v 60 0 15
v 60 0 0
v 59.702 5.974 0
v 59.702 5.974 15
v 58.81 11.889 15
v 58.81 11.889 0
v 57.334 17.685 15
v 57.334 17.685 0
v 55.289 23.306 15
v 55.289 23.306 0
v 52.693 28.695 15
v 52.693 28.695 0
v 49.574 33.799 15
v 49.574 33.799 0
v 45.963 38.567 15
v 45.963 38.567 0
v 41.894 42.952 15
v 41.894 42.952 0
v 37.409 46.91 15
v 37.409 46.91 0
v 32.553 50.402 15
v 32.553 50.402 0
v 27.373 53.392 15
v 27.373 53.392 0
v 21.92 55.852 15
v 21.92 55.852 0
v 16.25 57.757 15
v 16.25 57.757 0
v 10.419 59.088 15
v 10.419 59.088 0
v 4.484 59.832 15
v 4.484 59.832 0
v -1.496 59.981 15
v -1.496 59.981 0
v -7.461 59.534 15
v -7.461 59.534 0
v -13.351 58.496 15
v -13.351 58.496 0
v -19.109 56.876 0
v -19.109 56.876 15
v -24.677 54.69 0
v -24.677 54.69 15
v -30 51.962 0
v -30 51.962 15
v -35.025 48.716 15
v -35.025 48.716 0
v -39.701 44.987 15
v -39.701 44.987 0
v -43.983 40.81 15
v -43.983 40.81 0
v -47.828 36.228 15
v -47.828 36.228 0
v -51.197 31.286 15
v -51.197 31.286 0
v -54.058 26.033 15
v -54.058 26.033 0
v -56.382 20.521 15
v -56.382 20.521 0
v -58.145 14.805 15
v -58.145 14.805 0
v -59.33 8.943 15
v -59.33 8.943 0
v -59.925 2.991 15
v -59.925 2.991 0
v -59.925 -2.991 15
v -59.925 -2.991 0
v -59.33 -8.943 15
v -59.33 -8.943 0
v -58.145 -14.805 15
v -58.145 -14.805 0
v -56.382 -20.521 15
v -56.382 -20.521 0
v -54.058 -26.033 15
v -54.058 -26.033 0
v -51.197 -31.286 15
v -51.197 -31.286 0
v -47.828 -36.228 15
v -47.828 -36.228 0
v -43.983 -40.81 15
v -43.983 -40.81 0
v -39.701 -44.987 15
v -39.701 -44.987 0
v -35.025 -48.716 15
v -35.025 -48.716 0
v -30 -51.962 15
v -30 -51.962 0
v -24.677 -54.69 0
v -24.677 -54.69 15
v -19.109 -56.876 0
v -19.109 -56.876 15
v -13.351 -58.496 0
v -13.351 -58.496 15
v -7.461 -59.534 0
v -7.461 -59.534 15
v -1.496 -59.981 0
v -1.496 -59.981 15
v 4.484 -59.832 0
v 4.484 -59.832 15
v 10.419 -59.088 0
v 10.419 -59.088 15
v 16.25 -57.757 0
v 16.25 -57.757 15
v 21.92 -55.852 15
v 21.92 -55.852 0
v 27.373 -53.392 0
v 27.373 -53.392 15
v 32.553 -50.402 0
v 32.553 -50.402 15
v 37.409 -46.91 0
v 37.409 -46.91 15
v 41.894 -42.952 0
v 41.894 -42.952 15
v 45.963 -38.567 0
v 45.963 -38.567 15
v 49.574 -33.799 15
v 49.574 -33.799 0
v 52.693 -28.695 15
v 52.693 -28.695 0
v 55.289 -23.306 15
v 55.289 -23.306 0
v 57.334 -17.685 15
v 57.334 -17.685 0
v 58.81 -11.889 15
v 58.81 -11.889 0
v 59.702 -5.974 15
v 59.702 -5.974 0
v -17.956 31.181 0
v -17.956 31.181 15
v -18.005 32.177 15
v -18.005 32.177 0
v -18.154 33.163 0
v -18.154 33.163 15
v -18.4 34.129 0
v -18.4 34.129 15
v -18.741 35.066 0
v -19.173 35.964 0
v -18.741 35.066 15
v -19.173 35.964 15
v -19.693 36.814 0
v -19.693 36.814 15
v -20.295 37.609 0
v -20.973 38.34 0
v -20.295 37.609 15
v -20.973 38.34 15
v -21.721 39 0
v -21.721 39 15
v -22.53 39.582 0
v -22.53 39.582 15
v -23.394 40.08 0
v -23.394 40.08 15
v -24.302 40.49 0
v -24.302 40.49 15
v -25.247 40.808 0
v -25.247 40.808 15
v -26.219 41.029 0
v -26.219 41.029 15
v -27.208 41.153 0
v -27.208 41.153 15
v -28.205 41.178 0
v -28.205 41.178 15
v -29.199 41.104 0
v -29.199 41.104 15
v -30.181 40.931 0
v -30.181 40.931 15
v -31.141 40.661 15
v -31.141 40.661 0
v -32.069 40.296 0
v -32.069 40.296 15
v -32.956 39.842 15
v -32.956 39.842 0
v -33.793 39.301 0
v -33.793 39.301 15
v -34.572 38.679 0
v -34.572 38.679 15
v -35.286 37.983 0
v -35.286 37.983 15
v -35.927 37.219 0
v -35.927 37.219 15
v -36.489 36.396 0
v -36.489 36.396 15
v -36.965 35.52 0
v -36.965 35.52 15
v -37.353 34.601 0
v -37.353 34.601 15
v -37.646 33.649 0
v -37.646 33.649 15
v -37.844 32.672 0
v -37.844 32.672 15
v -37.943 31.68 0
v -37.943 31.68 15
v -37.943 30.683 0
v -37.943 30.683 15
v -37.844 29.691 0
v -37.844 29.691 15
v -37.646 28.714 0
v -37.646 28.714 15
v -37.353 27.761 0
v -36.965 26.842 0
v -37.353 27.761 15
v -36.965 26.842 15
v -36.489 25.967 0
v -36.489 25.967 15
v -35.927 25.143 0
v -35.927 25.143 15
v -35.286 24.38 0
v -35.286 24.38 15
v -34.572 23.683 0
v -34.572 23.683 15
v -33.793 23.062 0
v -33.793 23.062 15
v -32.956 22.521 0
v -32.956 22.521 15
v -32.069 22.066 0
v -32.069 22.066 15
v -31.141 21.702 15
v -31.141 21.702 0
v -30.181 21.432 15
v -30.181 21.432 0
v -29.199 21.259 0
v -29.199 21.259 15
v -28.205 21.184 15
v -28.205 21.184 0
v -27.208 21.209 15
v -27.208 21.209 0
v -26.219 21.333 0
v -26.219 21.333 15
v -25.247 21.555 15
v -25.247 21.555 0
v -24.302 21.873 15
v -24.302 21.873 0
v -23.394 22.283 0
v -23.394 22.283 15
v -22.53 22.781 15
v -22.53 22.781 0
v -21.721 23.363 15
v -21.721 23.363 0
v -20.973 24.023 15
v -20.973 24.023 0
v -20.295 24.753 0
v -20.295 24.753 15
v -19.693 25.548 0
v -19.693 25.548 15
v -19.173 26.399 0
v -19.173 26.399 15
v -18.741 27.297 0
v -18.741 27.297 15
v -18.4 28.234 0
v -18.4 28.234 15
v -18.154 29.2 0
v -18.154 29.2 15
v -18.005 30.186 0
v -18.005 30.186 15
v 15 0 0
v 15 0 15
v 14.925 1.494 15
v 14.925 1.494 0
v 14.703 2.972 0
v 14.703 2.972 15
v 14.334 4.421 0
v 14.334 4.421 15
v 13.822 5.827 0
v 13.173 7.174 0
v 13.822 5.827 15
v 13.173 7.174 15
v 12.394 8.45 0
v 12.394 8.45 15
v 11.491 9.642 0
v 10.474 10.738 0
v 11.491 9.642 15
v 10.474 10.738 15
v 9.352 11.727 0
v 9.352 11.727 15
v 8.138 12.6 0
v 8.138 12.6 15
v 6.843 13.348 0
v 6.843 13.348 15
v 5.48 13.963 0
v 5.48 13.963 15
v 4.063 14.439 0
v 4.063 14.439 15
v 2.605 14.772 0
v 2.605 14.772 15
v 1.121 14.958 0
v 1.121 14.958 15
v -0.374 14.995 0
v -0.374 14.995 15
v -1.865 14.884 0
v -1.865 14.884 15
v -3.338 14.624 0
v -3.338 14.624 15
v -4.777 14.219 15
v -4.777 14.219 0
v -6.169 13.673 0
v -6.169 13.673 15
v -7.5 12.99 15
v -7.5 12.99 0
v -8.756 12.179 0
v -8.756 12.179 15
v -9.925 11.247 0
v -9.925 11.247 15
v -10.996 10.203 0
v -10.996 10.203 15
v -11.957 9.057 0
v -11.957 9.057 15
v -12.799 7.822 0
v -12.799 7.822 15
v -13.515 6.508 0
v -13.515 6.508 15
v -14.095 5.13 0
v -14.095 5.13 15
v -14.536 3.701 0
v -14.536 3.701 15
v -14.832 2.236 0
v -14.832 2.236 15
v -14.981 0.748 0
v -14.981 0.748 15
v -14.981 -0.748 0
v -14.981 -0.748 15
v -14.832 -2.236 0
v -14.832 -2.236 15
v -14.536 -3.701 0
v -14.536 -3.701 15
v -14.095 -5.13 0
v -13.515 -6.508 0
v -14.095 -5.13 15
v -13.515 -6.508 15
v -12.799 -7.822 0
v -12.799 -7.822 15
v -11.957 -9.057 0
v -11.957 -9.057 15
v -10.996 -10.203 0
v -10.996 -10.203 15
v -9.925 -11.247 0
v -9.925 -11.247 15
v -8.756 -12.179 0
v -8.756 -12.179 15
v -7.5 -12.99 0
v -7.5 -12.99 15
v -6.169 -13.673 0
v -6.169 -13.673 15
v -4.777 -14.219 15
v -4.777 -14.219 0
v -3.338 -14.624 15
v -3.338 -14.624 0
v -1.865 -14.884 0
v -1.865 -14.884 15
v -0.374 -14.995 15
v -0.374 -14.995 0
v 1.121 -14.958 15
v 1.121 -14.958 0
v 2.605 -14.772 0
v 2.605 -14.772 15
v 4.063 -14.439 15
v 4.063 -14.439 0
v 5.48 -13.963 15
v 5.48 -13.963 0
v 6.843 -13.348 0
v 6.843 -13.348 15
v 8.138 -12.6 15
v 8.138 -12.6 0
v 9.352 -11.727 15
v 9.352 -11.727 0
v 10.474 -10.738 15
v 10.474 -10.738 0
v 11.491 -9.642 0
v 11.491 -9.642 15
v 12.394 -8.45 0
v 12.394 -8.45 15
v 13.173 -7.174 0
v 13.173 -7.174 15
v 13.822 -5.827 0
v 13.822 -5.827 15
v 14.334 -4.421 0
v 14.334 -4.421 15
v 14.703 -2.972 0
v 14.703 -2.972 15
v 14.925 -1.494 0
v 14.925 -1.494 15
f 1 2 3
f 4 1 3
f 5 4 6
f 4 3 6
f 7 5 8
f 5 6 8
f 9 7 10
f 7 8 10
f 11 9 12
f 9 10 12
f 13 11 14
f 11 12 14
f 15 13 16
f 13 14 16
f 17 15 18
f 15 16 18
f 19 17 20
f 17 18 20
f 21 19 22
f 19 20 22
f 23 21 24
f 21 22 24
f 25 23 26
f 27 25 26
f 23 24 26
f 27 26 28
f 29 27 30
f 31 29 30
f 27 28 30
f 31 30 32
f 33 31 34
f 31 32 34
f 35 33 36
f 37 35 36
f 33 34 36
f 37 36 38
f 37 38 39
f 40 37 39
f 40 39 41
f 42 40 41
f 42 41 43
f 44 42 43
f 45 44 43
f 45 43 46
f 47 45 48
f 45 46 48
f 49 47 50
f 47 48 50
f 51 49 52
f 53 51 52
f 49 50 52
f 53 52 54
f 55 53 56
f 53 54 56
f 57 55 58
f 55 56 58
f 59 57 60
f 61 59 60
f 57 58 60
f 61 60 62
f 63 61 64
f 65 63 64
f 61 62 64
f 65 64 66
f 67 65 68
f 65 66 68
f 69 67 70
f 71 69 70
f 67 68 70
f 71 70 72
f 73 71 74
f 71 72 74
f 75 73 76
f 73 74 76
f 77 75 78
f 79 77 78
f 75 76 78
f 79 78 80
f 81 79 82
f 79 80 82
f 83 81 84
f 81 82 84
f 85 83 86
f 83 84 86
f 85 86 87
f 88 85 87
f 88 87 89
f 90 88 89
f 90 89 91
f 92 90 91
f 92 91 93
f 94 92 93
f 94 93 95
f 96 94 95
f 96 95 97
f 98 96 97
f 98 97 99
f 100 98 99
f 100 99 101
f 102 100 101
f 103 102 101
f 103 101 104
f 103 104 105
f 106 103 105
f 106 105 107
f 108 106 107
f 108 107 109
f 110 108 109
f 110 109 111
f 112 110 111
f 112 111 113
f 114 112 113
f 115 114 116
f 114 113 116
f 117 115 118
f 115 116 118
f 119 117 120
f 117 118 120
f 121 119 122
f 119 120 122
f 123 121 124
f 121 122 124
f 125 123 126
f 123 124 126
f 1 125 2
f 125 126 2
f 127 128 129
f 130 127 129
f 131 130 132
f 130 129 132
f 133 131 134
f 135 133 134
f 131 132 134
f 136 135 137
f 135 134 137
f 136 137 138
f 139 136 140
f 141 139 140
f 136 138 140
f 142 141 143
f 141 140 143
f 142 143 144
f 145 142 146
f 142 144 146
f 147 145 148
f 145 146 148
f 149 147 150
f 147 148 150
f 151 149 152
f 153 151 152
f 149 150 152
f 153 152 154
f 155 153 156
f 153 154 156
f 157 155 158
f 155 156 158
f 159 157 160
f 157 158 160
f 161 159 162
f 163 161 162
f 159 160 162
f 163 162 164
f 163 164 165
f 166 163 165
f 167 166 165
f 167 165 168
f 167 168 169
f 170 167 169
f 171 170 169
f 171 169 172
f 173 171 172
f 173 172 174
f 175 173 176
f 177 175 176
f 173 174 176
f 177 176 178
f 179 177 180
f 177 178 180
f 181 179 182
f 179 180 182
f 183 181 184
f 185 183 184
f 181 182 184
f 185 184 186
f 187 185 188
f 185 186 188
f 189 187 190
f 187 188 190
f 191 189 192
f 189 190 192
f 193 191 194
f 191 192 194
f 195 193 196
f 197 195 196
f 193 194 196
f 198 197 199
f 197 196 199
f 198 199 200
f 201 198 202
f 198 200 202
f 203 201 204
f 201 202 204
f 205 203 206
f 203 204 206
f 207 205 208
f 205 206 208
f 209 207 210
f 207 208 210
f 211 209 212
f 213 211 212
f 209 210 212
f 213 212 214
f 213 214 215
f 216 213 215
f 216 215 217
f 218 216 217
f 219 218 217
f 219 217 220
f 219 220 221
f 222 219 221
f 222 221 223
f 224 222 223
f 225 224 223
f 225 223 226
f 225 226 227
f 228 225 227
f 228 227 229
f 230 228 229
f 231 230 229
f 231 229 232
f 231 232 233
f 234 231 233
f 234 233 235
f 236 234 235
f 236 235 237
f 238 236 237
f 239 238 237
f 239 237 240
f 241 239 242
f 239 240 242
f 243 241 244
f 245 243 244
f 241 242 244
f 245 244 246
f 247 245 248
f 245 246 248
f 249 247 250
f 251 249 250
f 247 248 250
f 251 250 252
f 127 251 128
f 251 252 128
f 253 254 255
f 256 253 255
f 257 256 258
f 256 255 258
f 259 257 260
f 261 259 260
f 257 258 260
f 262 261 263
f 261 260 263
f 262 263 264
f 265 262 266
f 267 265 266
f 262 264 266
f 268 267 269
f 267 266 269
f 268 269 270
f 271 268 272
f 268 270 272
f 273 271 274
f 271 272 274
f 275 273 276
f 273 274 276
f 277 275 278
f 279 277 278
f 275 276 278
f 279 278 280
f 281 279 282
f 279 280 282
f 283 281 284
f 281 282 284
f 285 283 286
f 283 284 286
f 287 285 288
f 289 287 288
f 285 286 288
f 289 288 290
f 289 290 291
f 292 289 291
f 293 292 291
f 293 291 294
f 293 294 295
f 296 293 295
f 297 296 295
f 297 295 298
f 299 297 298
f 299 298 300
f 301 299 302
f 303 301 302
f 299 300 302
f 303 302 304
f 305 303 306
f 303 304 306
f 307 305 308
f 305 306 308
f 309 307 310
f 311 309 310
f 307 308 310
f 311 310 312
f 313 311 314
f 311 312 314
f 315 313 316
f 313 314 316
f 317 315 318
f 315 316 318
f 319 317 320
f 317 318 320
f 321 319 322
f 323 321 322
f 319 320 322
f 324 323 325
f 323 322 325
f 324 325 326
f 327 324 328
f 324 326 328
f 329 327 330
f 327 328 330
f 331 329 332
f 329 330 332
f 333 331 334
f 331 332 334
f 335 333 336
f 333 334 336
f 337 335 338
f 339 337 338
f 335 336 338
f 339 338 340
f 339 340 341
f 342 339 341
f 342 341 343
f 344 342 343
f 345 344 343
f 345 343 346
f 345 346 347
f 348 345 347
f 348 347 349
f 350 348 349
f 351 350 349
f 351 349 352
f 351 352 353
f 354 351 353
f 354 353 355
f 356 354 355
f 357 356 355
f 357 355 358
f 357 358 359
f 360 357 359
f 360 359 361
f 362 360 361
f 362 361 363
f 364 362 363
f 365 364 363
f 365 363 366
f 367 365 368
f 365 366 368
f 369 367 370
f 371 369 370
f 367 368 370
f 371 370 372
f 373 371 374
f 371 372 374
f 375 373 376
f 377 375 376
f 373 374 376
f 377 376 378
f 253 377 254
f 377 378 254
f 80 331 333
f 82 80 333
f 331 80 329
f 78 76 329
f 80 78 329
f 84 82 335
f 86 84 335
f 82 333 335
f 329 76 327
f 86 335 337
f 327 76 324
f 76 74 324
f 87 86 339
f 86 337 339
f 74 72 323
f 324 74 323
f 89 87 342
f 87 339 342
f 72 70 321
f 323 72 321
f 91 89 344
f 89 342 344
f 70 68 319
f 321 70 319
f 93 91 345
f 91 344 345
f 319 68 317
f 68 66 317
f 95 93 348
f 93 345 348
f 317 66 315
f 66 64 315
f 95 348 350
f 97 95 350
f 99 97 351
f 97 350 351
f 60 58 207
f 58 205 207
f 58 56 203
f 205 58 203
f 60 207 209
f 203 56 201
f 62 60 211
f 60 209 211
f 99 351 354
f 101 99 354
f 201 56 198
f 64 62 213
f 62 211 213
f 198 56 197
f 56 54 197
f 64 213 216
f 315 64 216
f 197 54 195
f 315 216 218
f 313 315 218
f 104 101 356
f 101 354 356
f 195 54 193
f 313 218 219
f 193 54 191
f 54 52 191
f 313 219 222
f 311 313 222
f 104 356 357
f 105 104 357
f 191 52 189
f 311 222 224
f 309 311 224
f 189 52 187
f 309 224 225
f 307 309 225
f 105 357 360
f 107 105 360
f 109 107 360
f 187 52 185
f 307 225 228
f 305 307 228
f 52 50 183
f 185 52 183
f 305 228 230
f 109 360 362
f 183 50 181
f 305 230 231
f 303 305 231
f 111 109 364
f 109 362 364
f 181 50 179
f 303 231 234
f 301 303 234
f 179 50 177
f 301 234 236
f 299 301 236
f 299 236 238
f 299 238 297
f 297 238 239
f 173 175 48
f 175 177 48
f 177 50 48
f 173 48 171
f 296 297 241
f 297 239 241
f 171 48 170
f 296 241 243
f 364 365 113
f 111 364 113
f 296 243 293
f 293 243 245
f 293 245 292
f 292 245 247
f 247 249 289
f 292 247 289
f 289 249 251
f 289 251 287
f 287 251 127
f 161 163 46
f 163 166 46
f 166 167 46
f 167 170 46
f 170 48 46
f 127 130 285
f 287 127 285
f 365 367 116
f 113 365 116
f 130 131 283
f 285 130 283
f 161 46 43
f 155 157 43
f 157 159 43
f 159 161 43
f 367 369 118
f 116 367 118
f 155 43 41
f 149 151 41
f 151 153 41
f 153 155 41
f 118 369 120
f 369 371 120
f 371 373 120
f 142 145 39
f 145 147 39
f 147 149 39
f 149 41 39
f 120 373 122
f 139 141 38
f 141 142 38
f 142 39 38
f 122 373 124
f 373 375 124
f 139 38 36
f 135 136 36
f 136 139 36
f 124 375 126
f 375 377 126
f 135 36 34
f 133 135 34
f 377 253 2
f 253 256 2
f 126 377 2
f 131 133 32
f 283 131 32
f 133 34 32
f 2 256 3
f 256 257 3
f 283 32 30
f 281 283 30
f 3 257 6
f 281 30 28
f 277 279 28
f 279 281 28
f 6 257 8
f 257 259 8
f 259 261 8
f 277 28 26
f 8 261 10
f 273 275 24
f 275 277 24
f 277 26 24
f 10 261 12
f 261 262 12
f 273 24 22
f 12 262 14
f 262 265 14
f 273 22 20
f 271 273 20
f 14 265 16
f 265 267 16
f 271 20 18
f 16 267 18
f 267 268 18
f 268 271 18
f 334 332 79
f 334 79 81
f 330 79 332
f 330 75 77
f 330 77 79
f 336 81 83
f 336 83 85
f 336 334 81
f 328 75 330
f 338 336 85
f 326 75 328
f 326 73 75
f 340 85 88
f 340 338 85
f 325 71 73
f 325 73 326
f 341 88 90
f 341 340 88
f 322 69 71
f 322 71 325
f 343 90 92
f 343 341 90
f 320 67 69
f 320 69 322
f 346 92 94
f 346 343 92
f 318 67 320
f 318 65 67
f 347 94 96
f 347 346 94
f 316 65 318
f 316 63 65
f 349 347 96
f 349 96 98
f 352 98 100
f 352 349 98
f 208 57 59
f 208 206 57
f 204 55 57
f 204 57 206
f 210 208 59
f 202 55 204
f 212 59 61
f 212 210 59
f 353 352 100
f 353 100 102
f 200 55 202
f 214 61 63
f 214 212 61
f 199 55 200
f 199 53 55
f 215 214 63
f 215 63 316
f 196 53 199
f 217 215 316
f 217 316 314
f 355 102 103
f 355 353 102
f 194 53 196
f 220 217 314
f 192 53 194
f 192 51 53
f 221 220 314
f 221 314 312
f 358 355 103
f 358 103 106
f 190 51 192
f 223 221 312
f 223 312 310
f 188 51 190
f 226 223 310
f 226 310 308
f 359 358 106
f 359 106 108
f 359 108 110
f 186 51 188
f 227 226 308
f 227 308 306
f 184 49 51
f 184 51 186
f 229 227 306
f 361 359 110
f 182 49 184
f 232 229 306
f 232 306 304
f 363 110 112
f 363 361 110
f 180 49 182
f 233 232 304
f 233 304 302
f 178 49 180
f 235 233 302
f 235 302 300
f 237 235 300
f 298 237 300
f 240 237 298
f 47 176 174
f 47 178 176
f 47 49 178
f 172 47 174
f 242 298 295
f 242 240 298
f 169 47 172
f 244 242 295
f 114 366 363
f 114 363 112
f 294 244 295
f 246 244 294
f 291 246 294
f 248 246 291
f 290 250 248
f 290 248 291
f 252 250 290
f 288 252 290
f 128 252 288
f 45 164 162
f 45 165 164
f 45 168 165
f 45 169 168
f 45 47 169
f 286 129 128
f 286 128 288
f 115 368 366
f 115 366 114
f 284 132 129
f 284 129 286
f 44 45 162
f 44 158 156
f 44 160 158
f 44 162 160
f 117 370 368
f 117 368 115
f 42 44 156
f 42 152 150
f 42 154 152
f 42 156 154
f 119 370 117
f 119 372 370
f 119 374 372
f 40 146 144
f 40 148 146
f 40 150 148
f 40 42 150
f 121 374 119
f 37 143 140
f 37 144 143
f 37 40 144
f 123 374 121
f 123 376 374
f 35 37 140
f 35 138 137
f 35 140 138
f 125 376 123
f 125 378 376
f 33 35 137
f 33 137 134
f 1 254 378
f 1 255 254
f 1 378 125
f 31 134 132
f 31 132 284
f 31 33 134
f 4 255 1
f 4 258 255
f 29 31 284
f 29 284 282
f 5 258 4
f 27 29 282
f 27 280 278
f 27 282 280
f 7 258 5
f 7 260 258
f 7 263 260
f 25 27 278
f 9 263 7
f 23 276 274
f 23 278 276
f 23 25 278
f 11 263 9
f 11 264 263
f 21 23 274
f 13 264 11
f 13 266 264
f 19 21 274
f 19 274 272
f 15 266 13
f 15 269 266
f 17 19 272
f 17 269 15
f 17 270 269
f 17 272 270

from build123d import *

# Parameters (mm, degrees)
SKETCH1_R           = 60
BOSS_EXTRUDE1_DEPTH = 15
SKETCH3_R           = 15
CUT_EXTRUDE1_DEPTH  = 15
SKETCH4_R           = 10
CUT_EXTRUDE2_DEPTH  = 15


with BuildPart() as part:
    # Sketch1 → Boss-Extrude1 (new body)
    with BuildSketch(Plane.XY):
        Circle(SKETCH1_R)
    extrude(amount=BOSS_EXTRUDE1_DEPTH)

    # Sketch3 → Cut-Extrude1 (cut)
    with BuildSketch(Plane.XY.offset(15)):
        Circle(SKETCH3_R)
    extrude(amount=-CUT_EXTRUDE1_DEPTH, mode=Mode.SUBTRACT)

    # Sketch4 → Cut-Extrude2 (cut)
    with BuildSketch(Plane.XY.offset(15)):
        with Locations((-27.955634388, 31.181284509)):
            Circle(SKETCH4_R)
    extrude(amount=-CUT_EXTRUDE2_DEPTH, mode=Mode.SUBTRACT)


solid = part.part
